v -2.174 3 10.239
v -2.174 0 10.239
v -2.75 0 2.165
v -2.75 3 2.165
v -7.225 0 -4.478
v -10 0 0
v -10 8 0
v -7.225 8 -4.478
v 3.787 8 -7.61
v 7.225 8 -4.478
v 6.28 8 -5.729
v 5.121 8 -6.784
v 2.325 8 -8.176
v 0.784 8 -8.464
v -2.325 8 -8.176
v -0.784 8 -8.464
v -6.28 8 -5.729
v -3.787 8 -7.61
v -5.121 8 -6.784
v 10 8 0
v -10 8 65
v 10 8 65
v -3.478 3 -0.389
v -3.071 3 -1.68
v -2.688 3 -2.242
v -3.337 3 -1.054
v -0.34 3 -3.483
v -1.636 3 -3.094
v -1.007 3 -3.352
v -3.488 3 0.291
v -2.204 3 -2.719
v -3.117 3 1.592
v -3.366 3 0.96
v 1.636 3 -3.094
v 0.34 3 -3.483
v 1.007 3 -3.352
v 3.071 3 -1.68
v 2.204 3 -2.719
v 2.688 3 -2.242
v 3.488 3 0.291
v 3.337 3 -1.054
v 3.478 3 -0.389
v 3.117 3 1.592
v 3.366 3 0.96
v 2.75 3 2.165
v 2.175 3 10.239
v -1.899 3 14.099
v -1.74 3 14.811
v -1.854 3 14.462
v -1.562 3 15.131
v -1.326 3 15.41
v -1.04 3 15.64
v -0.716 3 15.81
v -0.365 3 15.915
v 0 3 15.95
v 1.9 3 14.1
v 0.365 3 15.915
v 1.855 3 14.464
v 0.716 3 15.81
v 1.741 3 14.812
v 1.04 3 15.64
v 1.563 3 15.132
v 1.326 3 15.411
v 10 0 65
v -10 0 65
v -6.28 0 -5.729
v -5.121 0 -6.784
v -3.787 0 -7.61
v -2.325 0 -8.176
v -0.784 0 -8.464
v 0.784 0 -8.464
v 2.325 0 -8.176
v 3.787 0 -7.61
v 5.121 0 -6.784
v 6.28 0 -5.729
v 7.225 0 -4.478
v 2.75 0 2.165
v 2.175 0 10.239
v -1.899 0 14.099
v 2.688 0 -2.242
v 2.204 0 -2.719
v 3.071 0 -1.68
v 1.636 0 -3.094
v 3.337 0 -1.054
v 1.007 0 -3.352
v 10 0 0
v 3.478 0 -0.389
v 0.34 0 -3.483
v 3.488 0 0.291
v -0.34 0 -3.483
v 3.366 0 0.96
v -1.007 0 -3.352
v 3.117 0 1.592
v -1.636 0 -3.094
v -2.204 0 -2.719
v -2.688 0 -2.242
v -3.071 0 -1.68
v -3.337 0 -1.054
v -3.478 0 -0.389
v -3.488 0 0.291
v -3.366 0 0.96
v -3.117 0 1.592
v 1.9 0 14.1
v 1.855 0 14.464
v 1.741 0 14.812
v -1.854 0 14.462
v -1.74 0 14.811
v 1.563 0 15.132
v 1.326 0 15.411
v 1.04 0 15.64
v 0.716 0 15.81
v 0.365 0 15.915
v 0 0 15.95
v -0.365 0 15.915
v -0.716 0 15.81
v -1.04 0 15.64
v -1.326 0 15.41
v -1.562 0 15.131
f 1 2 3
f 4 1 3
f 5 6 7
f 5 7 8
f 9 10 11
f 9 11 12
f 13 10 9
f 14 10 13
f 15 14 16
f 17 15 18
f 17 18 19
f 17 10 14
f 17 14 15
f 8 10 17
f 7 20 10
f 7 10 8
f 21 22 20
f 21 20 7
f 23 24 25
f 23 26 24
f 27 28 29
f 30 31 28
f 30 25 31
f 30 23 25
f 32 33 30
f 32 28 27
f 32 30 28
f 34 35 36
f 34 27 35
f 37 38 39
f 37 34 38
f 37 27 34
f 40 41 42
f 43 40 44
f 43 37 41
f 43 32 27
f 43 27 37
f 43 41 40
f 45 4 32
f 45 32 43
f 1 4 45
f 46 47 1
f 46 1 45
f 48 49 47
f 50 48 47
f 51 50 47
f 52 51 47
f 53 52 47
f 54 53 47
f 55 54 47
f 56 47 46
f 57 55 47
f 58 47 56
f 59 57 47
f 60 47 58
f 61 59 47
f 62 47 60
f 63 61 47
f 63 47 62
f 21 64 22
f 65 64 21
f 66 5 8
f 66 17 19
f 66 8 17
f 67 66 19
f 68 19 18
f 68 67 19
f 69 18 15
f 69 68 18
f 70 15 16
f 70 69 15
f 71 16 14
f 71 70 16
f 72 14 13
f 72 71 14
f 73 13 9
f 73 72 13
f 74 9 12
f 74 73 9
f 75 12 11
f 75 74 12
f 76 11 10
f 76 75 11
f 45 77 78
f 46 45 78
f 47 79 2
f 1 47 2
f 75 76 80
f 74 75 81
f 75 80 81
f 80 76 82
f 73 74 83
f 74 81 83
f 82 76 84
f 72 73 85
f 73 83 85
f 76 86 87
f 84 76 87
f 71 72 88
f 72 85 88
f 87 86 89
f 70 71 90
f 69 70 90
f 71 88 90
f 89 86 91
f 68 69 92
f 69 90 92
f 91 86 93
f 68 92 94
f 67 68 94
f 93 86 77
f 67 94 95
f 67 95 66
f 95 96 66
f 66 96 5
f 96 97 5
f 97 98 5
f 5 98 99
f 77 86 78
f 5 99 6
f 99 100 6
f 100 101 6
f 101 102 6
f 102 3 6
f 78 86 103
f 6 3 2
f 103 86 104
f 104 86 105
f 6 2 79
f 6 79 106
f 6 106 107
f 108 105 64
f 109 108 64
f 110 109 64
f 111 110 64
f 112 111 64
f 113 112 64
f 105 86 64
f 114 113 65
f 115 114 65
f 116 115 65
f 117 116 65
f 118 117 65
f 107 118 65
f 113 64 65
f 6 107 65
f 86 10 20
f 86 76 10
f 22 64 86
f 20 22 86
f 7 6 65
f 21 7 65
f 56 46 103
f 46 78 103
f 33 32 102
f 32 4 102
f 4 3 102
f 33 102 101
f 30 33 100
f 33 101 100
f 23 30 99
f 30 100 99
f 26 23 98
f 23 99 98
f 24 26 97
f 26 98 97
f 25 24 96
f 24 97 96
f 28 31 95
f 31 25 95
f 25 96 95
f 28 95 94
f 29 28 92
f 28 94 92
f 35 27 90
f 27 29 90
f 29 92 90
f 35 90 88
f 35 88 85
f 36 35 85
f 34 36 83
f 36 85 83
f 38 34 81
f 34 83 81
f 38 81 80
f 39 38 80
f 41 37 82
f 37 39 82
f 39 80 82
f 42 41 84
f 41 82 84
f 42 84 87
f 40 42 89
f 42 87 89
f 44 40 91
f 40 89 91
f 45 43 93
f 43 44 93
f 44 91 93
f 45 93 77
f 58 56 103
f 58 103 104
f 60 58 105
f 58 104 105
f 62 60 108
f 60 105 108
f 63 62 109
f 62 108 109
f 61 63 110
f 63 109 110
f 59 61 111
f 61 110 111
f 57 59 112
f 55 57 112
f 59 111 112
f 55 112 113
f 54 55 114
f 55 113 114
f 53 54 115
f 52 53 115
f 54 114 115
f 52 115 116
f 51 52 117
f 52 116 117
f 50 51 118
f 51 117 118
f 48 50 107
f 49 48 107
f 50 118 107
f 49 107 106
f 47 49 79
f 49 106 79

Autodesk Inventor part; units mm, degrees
ref_plane "YZ Plane" through (0, 0, 0) normal (1, 0, 0) x (0, 1, 0)
ref_plane "XZ Plane" through (0, 0, 0) normal (0, 1, 0) x (-1, 0, 0)
ref_plane "XY Plane" through (0, 0, 0) normal (0, 0, 1) x (1, 0, 0)
sketch "Sketch1" plane through (0, 0, 0) normal (0, 1, 0) x (-1, 0, 0)
  arc A0 (-2.75, 2.165064) -> (2.75, 2.165064) centre (0, 0) ccw
  line L0 (-1.9, 14.1) -> (-2.75, 2.165064)
  line L1 (1.898718, 14.098684) -> (2.75, 2.165064)
  arc A1 (1.898718, 14.098684) -> (-1.9, 14.1) centre (-0.000658, 14.05) ccw
  circle A2 centre (0, 0) radius 0.5
  line L2 (0, 0) -> (0, -10) construction
  line L3 (0, 30) -> (0, 0) construction
  arc A3 (-7.653502, 3.697825) -> (7.653343, 3.698154) centre (0, 0) ccw
  line L4 (7.653343, 3.698154) -> (6.891627, 14.376202)
  arc A4 (6.891627, 14.376202) -> (-6.892842, 14.378331) centre (-0.000658, 14.05) ccw
  line L5 (-6.892842, 14.378331) -> (-7.653502, 3.697825)
  line L6 (10, 0) -> (-10, 0)
  line L7 (-10, 0) -> (-10, 30)
  line L8 (-10, 30) -> (10, 30)
  line L9 (10, 30) -> (10, 0)
  point P0 (-8.5, 0)
  point P1 (8.5, 0)
  dimension "d0" = 1
  dimension "d9" = 1.9
  dimension "d11" = 3.5
  dimension "d34" = 10
  dimension "d42" = 5
  dimension "d43" = 20
  dimension "d44" = 30
sketch "Sketch1 outline for Extrusion6" plane through (0, 0, 0) normal (0, 1, 0) x (-1, 0, 0)
  arc A0 (-8.5, 0) -> (8.5, 0) centre (0, 0) ccw
  line L0 (-10, 0) -> (-8.5, 0)
  line L1 (8.5, 0) -> (10, 0)
  line L2 (-10, 30) -> (-10, 0)
  line L3 (10, 0) -> (10, 30)
  line L4 (10, 30) -> (-10, 30)
  arc A1 (2.75, 2.165064) -> (-2.75, 2.165064) centre (0, 0) cw
  line L5 (1.898718, 14.098684) -> (2.75, 2.165064)
  arc A2 (-1.9, 14.1) -> (1.898718, 14.098684) centre (-0.000658, 14.05) cw
  line L6 (-2.75, 2.165064) -> (-1.9, 14.1)
extrude "Extrusion6" add sketch "Sketch1 outline for Extrusion6" along normal blind 8
sketch "Sketch7" plane through (0, 0, 0) normal (0, -1, 0) x (1, 0, 0)
  arc A0 (-8.5, 0) -> (8.5, 0) centre (0, 0) ccw
  line L0 (10, 30) -> (10, 0)
  line L1 (-10, 0) -> (-10, 30)
  line L2 (-10, 0) -> (-10, 30)
  line L3 (-10, 0) -> (-7.225, -4.477653)
  line L4 (10, 0) -> (7.225, -4.477653)
  line L5 (8.5, 0) -> (10, 0)
  line L6 (-8.5, 0) -> (-10, 0)
  line L7 (-8.5, 0) -> (-10, 0)
sketch "Sketch7 outline for Extrusion7" plane through (0, 0, 0) normal (0, -1, 0) x (1, 0, 0)
  line L0 (-8.5, 0) -> (-10, 0)
  arc A0 (-7.225, -4.477653) -> (-8.5, 0) centre (0, 0) cw
  line L1 (-10, 0) -> (-7.225, -4.477653)
  line L2 (10, 0) -> (8.5, 0)
  line L3 (7.225, -4.477653) -> (10, 0)
  arc A1 (8.5, 0) -> (7.225, -4.477653) centre (0, 0) cw
extrude "Extrusion7" add sketch "Sketch7 outline for Extrusion7" against normal blind 8
sketch "Sketch8" plane through (0, 0, 0) normal (0, -1, 0) x (1, 0, 0)
  line L0 (-10, 0) -> (-7.225, -4.477653)
  arc A0 (-7.225, -4.477653) -> (7.225, -4.477653) centre (0, 0) ccw
  line L1 (7.225, -4.477653) -> (10, 0)
  line L2 (10, 30) -> (10, 0)
  line L3 (-10, 30) -> (10, 30)
  line L4 (-10, 0) -> (-10, 30)
  arc A1 (-2.75, 2.165064) -> (2.75, 2.165064) centre (0, 0) ccw
  line L5 (-1.898718, 14.098684) -> (-2.75, 2.165064)
  arc A2 (1.9, 14.1) -> (-1.898718, 14.098684) centre (0.000658, 14.05) ccw
  line L6 (2.75, 2.165064) -> (1.9, 14.1)
  circle A3 centre (0, 20) radius 10
  line L7 (10, 30) -> (10, 1.423737)
  line L8 (-10, 30) -> (10, 30)
  point P0 (-10, 20)
  point P1 (0, 30)
  point P2 (10, 20)
  point P3 (2.174951, 10.239386)
  point P4 (-2.174035, 10.239182)
  dimension "d50" = 20
sketch "Sketch8 outline for Extrusion8" plane through (0, 0, 0) normal (0, -1, 0) x (1, 0, 0)
  arc A0 (-10, 20) -> (0, 30) centre (0, 20) cw
  line L0 (-10, 30) -> (-10, 20)
  line L1 (0, 30) -> (-10, 30)
  arc A1 (0, 30) -> (10, 20) centre (0, 20) cw
  line L2 (10, 30) -> (0, 30)
  line L3 (10, 20) -> (10, 30)
extrude "Extrusion8" cut sketch "Sketch8 outline for Extrusion8" against normal through all
sketch "Sketch9" plane through (0, 8, 0) normal (0, 1, 0) x (1, 0, 0)
  arc A0 (-10, -20) -> (10, -20) centre (0, -20) ccw
  line L0 (-10, 0) -> (-10, -20)
  arc A1 (-9.25, 1.210176) -> (-10, -1.423737) centre (-5, -1.423737) ccw
  line L1 (-7.225, 4.477653) -> (-10, 0)
  arc A2 (7.225, 4.477653) -> (-7.225, 4.477653) centre (0, 0) ccw
  line L2 (10, 0) -> (7.225, 4.477653)
  arc A3 (10, -1.423737) -> (9.25, 1.210176) centre (5, -1.423737) ccw
  line L3 (10, -20) -> (10, 0)
sketch "Sketch9 outline for Extrusion9" plane through (0, 8, 0) normal (0, 1, 0) x (1, 0, 0)
  arc A0 (-10, -20) -> (10, -20) centre (0, -20) ccw
  line L0 (-10, -1.423737) -> (-10, -20)
  arc A1 (-9.25, 1.210176) -> (-10, -1.423737) centre (-5, -1.423737) ccw
  line L1 (-7.225, 4.477653) -> (-9.25, 1.210176)
  arc A2 (7.225, 4.477653) -> (-7.225, 4.477653) centre (0, 0) ccw
  line L2 (9.25, 1.210176) -> (7.225, 4.477653)
  arc A3 (10, -1.423737) -> (9.25, 1.210176) centre (5, -1.423737) ccw
  line L3 (10, -20) -> (10, -1.423737)
extrude "Extrusion9" add sketch "Sketch9 outline for Extrusion9" against normal blind 5
sketch "Sketch10" plane through (0, 0, 0) normal (0, -1, 0) x (1, 0, 0)
  line L0 (10, 20) -> (10, 0) projected
  line L1 (0, 0) -> (10, 0)
  line L2 (10, 0) -> (10, 65)
  line L3 (10, 65) -> (0, 65)
  line L4 (0, 65) -> (0, 0) construction
  line L5 (-10, 0) -> (-10, 20) projected
  line L6 (0, 0) -> (-10, 0)
  line L7 (-10, 0) -> (-10, 65)
  line L8 (-10, 65) -> (0, 65)
  dimension "d55" = 65
sketch "Sketch10 outline for Extrusion10" plane through (0, 0, 0) normal (0, -1, 0) x (1, 0, 0)
  line L0 (-10, 0) -> (0, 0)
  line L1 (-10, 20) -> (-10, 0)
  line L2 (-10, 65) -> (-10, 20)
  line L3 (0, 65) -> (-10, 65)
  line L4 (10, 65) -> (0, 65)
  line L5 (10, 20) -> (10, 65)
  line L6 (10, 0) -> (10, 20)
  line L7 (0, 0) -> (10, 0)
extrude "Extrusion10" add sketch "Sketch10 outline for Extrusion10" against normal blind 8
sketch "Sketch8 outline for Extrusion11" plane through (0, 0, 0) normal (0, -1, 0) x (1, 0, 0)
  arc A0 (-2.75, 2.165064) -> (2.75, 2.165064) centre (0, 0) ccw
  line L0 (-2.174035, 10.239182) -> (-2.75, 2.165064)
  arc A1 (2.174951, 10.239386) -> (-2.174035, 10.239182) centre (0, 20) cw
  line L1 (2.75, 2.165064) -> (2.174951, 10.239386)
extrude "Extrusion11" cut sketch "Sketch8 outline for Extrusion11" against normal blind 3
sketch "Sketch8 outline for Extrusion12" plane through (0, 0, 0) normal (0, -1, 0) x (1, 0, 0)
  arc A0 (1.9, 14.1) -> (-1.898718, 14.098684) centre (0.000658, 14.05) ccw
  line L0 (2.174951, 10.239386) -> (1.9, 14.1)
  arc A1 (-2.174035, 10.239182) -> (2.174951, 10.239386) centre (0, 20) ccw
  line L1 (-1.898718, 14.098684) -> (-2.174035, 10.239182)
extrude "Extrusion12" cut sketch "Sketch8 outline for Extrusion12" against normal blind 3
properties part number "Servo_Shaft_select_V2_3DPrint"
